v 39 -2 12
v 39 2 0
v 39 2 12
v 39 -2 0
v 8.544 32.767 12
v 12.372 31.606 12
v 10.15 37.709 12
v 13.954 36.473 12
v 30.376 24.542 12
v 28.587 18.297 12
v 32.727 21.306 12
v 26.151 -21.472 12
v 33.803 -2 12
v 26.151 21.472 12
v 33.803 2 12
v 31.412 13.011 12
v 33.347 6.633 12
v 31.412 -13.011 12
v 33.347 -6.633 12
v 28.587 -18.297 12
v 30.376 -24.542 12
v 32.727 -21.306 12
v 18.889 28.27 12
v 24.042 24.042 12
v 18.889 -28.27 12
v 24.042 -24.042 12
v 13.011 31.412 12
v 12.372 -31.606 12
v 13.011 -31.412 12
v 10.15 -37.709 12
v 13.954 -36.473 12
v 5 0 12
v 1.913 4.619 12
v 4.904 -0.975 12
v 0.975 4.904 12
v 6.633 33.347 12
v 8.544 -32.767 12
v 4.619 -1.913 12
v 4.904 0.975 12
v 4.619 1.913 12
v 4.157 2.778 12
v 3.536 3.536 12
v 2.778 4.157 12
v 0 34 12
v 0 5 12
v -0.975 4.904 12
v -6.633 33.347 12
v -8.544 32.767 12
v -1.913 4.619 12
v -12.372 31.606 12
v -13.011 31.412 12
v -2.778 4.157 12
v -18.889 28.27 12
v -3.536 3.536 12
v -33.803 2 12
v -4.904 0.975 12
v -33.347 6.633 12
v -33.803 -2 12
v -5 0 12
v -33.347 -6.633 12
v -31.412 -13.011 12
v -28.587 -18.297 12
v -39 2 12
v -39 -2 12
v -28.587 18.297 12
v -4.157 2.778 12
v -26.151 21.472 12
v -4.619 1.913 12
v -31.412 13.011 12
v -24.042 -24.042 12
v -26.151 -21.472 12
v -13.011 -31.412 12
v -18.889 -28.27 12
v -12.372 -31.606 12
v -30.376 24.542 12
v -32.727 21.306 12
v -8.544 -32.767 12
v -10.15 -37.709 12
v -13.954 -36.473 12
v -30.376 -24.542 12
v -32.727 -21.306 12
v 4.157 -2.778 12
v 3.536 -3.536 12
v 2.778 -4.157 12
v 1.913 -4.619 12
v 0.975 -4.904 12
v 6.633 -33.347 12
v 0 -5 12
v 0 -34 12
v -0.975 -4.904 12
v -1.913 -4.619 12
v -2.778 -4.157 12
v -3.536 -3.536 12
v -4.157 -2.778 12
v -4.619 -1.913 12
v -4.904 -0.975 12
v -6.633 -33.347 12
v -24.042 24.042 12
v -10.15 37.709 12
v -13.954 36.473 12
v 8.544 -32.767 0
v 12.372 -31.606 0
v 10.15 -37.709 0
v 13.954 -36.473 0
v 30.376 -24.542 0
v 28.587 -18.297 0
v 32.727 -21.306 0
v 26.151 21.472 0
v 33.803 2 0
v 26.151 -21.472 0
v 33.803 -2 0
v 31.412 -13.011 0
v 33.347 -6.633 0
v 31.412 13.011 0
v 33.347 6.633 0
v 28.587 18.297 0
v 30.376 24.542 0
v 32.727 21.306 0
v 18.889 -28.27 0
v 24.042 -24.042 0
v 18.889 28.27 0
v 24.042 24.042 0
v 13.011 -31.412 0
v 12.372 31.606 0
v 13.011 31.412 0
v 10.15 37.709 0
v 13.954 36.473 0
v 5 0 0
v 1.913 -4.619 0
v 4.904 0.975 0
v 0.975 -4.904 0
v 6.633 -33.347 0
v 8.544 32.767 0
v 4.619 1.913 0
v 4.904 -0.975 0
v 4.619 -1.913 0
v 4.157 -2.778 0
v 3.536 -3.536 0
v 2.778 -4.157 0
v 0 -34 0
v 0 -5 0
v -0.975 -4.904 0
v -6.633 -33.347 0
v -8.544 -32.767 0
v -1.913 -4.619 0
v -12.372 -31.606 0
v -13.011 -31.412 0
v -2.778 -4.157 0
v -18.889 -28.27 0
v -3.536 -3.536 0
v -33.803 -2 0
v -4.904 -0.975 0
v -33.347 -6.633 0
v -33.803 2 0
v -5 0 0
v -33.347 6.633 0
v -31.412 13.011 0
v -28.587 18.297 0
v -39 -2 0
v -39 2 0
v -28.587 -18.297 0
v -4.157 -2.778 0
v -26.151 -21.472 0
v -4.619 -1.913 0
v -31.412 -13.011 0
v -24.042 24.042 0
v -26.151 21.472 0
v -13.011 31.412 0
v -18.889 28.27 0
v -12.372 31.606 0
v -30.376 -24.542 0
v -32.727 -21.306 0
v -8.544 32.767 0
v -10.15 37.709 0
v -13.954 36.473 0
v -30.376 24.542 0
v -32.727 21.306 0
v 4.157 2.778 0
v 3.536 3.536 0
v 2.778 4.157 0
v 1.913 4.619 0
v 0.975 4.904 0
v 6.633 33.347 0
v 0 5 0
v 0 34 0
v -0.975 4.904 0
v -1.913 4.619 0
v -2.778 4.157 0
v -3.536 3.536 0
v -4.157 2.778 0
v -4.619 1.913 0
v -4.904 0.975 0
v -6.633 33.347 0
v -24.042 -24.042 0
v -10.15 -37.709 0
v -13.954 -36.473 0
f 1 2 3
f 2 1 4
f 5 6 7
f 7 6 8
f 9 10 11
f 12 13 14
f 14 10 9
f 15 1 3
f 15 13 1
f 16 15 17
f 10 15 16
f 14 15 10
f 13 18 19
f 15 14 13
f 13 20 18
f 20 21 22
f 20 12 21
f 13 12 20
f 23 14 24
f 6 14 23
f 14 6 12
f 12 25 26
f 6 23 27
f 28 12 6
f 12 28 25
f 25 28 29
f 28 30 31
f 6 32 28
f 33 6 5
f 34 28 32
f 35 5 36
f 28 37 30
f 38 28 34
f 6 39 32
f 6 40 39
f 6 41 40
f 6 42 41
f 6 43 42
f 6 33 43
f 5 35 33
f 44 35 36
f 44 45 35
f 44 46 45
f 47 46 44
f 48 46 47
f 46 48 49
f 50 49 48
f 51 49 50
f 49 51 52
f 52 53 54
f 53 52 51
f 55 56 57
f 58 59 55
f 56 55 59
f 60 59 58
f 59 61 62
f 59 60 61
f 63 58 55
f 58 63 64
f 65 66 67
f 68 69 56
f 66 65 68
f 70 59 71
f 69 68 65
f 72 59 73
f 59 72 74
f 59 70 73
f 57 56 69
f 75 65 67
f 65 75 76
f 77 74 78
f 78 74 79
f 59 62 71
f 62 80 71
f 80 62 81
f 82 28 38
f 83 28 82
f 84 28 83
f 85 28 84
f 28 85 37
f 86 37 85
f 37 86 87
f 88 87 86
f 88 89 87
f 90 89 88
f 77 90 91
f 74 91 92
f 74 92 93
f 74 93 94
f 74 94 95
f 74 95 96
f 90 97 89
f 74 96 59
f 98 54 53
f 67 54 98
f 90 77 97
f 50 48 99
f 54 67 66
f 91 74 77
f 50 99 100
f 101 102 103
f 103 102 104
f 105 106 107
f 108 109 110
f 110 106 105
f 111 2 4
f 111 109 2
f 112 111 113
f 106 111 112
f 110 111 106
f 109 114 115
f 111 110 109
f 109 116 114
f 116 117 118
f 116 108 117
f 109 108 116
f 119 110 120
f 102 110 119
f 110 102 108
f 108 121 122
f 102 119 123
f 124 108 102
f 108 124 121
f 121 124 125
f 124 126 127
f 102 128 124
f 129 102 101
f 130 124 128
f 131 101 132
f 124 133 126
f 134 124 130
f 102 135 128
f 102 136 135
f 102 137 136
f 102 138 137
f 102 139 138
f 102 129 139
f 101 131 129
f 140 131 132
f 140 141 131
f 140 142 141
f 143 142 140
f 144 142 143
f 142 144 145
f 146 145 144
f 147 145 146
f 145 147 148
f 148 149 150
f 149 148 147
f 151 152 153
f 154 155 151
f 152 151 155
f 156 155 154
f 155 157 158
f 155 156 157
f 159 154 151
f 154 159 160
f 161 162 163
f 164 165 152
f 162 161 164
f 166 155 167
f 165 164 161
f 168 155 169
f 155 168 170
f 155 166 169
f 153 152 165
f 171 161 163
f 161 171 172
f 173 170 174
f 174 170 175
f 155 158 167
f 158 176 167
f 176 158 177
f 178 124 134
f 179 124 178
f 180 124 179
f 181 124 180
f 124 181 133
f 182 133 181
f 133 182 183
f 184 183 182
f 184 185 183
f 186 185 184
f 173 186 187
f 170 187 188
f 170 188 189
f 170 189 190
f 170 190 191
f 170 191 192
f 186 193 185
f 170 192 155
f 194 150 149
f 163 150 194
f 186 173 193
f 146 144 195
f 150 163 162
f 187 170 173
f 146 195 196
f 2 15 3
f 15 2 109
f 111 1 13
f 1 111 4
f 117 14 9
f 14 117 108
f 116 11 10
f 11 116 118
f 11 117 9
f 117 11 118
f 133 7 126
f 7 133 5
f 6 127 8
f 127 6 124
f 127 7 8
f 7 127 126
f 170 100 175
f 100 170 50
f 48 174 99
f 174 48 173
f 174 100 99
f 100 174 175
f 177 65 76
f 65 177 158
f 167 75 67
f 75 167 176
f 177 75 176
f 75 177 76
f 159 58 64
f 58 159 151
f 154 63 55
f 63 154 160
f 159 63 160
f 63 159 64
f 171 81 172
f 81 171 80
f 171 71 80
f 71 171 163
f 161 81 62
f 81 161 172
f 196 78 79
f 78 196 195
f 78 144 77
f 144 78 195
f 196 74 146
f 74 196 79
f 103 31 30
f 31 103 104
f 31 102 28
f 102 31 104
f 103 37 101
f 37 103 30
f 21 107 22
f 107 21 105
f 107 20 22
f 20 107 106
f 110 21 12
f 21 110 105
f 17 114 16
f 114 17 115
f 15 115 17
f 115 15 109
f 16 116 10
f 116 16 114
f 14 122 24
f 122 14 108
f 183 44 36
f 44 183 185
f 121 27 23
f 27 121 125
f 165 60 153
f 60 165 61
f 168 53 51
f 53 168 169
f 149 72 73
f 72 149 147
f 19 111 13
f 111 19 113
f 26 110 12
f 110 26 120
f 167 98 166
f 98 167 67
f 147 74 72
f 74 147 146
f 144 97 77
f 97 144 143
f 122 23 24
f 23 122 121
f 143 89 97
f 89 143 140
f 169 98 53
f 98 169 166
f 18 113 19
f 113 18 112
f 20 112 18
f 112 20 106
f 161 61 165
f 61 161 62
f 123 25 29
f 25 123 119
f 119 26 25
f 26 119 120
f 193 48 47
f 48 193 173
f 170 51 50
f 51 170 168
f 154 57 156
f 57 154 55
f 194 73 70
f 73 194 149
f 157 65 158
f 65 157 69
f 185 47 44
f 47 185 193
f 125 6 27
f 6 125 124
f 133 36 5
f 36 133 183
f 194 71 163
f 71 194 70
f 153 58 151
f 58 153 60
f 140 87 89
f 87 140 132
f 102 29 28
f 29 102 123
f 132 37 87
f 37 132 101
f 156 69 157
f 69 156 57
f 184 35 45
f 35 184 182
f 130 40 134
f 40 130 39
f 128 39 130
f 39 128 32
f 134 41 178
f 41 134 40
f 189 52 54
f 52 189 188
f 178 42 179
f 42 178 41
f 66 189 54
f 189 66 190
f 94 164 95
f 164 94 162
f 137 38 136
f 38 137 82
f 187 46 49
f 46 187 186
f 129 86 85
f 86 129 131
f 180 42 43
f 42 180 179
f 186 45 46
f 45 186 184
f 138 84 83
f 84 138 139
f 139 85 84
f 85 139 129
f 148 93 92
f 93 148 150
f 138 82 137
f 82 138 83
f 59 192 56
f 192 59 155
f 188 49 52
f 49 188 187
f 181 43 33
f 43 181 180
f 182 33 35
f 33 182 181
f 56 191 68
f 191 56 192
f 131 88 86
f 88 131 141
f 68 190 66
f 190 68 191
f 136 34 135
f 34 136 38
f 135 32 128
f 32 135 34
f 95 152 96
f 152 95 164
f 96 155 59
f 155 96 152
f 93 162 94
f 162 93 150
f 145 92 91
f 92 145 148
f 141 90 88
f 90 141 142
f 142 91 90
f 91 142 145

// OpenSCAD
$fn = 32;

// ----------------------------------------------------------------------
// Spur blank: bored gear blank
// ----------------------------------------------------------------------

// --- parameters (mm) ---
disc_r = 34;              // blank root radius
disc_t = 12;              // blank thickness
n_teeth = 10;             // stub tooth count
tooth_w = 4;              // tooth width at the root
tooth_h = 5;              // tooth height above the root
bore_r = 5;               // central bore radius

out_r = disc_r + tooth_h;  // tip radius
bbox_x = 78.0;  // measured width over the teeth
bbox_y = 75.42;  // measured depth over the teeth

difference() {
union() {
  cylinder(r = disc_r, h = disc_t);
  for (i = [0 : n_teeth - 1])
    rotate([0, 0, i * 360 / n_teeth])
      translate([disc_r - 1, -tooth_w / 2, 0])
        cube([tooth_h + 1, tooth_w, disc_t]);
}
  translate([0, 0, -1]) cylinder(r = bore_r, h = disc_t + 2);
}
